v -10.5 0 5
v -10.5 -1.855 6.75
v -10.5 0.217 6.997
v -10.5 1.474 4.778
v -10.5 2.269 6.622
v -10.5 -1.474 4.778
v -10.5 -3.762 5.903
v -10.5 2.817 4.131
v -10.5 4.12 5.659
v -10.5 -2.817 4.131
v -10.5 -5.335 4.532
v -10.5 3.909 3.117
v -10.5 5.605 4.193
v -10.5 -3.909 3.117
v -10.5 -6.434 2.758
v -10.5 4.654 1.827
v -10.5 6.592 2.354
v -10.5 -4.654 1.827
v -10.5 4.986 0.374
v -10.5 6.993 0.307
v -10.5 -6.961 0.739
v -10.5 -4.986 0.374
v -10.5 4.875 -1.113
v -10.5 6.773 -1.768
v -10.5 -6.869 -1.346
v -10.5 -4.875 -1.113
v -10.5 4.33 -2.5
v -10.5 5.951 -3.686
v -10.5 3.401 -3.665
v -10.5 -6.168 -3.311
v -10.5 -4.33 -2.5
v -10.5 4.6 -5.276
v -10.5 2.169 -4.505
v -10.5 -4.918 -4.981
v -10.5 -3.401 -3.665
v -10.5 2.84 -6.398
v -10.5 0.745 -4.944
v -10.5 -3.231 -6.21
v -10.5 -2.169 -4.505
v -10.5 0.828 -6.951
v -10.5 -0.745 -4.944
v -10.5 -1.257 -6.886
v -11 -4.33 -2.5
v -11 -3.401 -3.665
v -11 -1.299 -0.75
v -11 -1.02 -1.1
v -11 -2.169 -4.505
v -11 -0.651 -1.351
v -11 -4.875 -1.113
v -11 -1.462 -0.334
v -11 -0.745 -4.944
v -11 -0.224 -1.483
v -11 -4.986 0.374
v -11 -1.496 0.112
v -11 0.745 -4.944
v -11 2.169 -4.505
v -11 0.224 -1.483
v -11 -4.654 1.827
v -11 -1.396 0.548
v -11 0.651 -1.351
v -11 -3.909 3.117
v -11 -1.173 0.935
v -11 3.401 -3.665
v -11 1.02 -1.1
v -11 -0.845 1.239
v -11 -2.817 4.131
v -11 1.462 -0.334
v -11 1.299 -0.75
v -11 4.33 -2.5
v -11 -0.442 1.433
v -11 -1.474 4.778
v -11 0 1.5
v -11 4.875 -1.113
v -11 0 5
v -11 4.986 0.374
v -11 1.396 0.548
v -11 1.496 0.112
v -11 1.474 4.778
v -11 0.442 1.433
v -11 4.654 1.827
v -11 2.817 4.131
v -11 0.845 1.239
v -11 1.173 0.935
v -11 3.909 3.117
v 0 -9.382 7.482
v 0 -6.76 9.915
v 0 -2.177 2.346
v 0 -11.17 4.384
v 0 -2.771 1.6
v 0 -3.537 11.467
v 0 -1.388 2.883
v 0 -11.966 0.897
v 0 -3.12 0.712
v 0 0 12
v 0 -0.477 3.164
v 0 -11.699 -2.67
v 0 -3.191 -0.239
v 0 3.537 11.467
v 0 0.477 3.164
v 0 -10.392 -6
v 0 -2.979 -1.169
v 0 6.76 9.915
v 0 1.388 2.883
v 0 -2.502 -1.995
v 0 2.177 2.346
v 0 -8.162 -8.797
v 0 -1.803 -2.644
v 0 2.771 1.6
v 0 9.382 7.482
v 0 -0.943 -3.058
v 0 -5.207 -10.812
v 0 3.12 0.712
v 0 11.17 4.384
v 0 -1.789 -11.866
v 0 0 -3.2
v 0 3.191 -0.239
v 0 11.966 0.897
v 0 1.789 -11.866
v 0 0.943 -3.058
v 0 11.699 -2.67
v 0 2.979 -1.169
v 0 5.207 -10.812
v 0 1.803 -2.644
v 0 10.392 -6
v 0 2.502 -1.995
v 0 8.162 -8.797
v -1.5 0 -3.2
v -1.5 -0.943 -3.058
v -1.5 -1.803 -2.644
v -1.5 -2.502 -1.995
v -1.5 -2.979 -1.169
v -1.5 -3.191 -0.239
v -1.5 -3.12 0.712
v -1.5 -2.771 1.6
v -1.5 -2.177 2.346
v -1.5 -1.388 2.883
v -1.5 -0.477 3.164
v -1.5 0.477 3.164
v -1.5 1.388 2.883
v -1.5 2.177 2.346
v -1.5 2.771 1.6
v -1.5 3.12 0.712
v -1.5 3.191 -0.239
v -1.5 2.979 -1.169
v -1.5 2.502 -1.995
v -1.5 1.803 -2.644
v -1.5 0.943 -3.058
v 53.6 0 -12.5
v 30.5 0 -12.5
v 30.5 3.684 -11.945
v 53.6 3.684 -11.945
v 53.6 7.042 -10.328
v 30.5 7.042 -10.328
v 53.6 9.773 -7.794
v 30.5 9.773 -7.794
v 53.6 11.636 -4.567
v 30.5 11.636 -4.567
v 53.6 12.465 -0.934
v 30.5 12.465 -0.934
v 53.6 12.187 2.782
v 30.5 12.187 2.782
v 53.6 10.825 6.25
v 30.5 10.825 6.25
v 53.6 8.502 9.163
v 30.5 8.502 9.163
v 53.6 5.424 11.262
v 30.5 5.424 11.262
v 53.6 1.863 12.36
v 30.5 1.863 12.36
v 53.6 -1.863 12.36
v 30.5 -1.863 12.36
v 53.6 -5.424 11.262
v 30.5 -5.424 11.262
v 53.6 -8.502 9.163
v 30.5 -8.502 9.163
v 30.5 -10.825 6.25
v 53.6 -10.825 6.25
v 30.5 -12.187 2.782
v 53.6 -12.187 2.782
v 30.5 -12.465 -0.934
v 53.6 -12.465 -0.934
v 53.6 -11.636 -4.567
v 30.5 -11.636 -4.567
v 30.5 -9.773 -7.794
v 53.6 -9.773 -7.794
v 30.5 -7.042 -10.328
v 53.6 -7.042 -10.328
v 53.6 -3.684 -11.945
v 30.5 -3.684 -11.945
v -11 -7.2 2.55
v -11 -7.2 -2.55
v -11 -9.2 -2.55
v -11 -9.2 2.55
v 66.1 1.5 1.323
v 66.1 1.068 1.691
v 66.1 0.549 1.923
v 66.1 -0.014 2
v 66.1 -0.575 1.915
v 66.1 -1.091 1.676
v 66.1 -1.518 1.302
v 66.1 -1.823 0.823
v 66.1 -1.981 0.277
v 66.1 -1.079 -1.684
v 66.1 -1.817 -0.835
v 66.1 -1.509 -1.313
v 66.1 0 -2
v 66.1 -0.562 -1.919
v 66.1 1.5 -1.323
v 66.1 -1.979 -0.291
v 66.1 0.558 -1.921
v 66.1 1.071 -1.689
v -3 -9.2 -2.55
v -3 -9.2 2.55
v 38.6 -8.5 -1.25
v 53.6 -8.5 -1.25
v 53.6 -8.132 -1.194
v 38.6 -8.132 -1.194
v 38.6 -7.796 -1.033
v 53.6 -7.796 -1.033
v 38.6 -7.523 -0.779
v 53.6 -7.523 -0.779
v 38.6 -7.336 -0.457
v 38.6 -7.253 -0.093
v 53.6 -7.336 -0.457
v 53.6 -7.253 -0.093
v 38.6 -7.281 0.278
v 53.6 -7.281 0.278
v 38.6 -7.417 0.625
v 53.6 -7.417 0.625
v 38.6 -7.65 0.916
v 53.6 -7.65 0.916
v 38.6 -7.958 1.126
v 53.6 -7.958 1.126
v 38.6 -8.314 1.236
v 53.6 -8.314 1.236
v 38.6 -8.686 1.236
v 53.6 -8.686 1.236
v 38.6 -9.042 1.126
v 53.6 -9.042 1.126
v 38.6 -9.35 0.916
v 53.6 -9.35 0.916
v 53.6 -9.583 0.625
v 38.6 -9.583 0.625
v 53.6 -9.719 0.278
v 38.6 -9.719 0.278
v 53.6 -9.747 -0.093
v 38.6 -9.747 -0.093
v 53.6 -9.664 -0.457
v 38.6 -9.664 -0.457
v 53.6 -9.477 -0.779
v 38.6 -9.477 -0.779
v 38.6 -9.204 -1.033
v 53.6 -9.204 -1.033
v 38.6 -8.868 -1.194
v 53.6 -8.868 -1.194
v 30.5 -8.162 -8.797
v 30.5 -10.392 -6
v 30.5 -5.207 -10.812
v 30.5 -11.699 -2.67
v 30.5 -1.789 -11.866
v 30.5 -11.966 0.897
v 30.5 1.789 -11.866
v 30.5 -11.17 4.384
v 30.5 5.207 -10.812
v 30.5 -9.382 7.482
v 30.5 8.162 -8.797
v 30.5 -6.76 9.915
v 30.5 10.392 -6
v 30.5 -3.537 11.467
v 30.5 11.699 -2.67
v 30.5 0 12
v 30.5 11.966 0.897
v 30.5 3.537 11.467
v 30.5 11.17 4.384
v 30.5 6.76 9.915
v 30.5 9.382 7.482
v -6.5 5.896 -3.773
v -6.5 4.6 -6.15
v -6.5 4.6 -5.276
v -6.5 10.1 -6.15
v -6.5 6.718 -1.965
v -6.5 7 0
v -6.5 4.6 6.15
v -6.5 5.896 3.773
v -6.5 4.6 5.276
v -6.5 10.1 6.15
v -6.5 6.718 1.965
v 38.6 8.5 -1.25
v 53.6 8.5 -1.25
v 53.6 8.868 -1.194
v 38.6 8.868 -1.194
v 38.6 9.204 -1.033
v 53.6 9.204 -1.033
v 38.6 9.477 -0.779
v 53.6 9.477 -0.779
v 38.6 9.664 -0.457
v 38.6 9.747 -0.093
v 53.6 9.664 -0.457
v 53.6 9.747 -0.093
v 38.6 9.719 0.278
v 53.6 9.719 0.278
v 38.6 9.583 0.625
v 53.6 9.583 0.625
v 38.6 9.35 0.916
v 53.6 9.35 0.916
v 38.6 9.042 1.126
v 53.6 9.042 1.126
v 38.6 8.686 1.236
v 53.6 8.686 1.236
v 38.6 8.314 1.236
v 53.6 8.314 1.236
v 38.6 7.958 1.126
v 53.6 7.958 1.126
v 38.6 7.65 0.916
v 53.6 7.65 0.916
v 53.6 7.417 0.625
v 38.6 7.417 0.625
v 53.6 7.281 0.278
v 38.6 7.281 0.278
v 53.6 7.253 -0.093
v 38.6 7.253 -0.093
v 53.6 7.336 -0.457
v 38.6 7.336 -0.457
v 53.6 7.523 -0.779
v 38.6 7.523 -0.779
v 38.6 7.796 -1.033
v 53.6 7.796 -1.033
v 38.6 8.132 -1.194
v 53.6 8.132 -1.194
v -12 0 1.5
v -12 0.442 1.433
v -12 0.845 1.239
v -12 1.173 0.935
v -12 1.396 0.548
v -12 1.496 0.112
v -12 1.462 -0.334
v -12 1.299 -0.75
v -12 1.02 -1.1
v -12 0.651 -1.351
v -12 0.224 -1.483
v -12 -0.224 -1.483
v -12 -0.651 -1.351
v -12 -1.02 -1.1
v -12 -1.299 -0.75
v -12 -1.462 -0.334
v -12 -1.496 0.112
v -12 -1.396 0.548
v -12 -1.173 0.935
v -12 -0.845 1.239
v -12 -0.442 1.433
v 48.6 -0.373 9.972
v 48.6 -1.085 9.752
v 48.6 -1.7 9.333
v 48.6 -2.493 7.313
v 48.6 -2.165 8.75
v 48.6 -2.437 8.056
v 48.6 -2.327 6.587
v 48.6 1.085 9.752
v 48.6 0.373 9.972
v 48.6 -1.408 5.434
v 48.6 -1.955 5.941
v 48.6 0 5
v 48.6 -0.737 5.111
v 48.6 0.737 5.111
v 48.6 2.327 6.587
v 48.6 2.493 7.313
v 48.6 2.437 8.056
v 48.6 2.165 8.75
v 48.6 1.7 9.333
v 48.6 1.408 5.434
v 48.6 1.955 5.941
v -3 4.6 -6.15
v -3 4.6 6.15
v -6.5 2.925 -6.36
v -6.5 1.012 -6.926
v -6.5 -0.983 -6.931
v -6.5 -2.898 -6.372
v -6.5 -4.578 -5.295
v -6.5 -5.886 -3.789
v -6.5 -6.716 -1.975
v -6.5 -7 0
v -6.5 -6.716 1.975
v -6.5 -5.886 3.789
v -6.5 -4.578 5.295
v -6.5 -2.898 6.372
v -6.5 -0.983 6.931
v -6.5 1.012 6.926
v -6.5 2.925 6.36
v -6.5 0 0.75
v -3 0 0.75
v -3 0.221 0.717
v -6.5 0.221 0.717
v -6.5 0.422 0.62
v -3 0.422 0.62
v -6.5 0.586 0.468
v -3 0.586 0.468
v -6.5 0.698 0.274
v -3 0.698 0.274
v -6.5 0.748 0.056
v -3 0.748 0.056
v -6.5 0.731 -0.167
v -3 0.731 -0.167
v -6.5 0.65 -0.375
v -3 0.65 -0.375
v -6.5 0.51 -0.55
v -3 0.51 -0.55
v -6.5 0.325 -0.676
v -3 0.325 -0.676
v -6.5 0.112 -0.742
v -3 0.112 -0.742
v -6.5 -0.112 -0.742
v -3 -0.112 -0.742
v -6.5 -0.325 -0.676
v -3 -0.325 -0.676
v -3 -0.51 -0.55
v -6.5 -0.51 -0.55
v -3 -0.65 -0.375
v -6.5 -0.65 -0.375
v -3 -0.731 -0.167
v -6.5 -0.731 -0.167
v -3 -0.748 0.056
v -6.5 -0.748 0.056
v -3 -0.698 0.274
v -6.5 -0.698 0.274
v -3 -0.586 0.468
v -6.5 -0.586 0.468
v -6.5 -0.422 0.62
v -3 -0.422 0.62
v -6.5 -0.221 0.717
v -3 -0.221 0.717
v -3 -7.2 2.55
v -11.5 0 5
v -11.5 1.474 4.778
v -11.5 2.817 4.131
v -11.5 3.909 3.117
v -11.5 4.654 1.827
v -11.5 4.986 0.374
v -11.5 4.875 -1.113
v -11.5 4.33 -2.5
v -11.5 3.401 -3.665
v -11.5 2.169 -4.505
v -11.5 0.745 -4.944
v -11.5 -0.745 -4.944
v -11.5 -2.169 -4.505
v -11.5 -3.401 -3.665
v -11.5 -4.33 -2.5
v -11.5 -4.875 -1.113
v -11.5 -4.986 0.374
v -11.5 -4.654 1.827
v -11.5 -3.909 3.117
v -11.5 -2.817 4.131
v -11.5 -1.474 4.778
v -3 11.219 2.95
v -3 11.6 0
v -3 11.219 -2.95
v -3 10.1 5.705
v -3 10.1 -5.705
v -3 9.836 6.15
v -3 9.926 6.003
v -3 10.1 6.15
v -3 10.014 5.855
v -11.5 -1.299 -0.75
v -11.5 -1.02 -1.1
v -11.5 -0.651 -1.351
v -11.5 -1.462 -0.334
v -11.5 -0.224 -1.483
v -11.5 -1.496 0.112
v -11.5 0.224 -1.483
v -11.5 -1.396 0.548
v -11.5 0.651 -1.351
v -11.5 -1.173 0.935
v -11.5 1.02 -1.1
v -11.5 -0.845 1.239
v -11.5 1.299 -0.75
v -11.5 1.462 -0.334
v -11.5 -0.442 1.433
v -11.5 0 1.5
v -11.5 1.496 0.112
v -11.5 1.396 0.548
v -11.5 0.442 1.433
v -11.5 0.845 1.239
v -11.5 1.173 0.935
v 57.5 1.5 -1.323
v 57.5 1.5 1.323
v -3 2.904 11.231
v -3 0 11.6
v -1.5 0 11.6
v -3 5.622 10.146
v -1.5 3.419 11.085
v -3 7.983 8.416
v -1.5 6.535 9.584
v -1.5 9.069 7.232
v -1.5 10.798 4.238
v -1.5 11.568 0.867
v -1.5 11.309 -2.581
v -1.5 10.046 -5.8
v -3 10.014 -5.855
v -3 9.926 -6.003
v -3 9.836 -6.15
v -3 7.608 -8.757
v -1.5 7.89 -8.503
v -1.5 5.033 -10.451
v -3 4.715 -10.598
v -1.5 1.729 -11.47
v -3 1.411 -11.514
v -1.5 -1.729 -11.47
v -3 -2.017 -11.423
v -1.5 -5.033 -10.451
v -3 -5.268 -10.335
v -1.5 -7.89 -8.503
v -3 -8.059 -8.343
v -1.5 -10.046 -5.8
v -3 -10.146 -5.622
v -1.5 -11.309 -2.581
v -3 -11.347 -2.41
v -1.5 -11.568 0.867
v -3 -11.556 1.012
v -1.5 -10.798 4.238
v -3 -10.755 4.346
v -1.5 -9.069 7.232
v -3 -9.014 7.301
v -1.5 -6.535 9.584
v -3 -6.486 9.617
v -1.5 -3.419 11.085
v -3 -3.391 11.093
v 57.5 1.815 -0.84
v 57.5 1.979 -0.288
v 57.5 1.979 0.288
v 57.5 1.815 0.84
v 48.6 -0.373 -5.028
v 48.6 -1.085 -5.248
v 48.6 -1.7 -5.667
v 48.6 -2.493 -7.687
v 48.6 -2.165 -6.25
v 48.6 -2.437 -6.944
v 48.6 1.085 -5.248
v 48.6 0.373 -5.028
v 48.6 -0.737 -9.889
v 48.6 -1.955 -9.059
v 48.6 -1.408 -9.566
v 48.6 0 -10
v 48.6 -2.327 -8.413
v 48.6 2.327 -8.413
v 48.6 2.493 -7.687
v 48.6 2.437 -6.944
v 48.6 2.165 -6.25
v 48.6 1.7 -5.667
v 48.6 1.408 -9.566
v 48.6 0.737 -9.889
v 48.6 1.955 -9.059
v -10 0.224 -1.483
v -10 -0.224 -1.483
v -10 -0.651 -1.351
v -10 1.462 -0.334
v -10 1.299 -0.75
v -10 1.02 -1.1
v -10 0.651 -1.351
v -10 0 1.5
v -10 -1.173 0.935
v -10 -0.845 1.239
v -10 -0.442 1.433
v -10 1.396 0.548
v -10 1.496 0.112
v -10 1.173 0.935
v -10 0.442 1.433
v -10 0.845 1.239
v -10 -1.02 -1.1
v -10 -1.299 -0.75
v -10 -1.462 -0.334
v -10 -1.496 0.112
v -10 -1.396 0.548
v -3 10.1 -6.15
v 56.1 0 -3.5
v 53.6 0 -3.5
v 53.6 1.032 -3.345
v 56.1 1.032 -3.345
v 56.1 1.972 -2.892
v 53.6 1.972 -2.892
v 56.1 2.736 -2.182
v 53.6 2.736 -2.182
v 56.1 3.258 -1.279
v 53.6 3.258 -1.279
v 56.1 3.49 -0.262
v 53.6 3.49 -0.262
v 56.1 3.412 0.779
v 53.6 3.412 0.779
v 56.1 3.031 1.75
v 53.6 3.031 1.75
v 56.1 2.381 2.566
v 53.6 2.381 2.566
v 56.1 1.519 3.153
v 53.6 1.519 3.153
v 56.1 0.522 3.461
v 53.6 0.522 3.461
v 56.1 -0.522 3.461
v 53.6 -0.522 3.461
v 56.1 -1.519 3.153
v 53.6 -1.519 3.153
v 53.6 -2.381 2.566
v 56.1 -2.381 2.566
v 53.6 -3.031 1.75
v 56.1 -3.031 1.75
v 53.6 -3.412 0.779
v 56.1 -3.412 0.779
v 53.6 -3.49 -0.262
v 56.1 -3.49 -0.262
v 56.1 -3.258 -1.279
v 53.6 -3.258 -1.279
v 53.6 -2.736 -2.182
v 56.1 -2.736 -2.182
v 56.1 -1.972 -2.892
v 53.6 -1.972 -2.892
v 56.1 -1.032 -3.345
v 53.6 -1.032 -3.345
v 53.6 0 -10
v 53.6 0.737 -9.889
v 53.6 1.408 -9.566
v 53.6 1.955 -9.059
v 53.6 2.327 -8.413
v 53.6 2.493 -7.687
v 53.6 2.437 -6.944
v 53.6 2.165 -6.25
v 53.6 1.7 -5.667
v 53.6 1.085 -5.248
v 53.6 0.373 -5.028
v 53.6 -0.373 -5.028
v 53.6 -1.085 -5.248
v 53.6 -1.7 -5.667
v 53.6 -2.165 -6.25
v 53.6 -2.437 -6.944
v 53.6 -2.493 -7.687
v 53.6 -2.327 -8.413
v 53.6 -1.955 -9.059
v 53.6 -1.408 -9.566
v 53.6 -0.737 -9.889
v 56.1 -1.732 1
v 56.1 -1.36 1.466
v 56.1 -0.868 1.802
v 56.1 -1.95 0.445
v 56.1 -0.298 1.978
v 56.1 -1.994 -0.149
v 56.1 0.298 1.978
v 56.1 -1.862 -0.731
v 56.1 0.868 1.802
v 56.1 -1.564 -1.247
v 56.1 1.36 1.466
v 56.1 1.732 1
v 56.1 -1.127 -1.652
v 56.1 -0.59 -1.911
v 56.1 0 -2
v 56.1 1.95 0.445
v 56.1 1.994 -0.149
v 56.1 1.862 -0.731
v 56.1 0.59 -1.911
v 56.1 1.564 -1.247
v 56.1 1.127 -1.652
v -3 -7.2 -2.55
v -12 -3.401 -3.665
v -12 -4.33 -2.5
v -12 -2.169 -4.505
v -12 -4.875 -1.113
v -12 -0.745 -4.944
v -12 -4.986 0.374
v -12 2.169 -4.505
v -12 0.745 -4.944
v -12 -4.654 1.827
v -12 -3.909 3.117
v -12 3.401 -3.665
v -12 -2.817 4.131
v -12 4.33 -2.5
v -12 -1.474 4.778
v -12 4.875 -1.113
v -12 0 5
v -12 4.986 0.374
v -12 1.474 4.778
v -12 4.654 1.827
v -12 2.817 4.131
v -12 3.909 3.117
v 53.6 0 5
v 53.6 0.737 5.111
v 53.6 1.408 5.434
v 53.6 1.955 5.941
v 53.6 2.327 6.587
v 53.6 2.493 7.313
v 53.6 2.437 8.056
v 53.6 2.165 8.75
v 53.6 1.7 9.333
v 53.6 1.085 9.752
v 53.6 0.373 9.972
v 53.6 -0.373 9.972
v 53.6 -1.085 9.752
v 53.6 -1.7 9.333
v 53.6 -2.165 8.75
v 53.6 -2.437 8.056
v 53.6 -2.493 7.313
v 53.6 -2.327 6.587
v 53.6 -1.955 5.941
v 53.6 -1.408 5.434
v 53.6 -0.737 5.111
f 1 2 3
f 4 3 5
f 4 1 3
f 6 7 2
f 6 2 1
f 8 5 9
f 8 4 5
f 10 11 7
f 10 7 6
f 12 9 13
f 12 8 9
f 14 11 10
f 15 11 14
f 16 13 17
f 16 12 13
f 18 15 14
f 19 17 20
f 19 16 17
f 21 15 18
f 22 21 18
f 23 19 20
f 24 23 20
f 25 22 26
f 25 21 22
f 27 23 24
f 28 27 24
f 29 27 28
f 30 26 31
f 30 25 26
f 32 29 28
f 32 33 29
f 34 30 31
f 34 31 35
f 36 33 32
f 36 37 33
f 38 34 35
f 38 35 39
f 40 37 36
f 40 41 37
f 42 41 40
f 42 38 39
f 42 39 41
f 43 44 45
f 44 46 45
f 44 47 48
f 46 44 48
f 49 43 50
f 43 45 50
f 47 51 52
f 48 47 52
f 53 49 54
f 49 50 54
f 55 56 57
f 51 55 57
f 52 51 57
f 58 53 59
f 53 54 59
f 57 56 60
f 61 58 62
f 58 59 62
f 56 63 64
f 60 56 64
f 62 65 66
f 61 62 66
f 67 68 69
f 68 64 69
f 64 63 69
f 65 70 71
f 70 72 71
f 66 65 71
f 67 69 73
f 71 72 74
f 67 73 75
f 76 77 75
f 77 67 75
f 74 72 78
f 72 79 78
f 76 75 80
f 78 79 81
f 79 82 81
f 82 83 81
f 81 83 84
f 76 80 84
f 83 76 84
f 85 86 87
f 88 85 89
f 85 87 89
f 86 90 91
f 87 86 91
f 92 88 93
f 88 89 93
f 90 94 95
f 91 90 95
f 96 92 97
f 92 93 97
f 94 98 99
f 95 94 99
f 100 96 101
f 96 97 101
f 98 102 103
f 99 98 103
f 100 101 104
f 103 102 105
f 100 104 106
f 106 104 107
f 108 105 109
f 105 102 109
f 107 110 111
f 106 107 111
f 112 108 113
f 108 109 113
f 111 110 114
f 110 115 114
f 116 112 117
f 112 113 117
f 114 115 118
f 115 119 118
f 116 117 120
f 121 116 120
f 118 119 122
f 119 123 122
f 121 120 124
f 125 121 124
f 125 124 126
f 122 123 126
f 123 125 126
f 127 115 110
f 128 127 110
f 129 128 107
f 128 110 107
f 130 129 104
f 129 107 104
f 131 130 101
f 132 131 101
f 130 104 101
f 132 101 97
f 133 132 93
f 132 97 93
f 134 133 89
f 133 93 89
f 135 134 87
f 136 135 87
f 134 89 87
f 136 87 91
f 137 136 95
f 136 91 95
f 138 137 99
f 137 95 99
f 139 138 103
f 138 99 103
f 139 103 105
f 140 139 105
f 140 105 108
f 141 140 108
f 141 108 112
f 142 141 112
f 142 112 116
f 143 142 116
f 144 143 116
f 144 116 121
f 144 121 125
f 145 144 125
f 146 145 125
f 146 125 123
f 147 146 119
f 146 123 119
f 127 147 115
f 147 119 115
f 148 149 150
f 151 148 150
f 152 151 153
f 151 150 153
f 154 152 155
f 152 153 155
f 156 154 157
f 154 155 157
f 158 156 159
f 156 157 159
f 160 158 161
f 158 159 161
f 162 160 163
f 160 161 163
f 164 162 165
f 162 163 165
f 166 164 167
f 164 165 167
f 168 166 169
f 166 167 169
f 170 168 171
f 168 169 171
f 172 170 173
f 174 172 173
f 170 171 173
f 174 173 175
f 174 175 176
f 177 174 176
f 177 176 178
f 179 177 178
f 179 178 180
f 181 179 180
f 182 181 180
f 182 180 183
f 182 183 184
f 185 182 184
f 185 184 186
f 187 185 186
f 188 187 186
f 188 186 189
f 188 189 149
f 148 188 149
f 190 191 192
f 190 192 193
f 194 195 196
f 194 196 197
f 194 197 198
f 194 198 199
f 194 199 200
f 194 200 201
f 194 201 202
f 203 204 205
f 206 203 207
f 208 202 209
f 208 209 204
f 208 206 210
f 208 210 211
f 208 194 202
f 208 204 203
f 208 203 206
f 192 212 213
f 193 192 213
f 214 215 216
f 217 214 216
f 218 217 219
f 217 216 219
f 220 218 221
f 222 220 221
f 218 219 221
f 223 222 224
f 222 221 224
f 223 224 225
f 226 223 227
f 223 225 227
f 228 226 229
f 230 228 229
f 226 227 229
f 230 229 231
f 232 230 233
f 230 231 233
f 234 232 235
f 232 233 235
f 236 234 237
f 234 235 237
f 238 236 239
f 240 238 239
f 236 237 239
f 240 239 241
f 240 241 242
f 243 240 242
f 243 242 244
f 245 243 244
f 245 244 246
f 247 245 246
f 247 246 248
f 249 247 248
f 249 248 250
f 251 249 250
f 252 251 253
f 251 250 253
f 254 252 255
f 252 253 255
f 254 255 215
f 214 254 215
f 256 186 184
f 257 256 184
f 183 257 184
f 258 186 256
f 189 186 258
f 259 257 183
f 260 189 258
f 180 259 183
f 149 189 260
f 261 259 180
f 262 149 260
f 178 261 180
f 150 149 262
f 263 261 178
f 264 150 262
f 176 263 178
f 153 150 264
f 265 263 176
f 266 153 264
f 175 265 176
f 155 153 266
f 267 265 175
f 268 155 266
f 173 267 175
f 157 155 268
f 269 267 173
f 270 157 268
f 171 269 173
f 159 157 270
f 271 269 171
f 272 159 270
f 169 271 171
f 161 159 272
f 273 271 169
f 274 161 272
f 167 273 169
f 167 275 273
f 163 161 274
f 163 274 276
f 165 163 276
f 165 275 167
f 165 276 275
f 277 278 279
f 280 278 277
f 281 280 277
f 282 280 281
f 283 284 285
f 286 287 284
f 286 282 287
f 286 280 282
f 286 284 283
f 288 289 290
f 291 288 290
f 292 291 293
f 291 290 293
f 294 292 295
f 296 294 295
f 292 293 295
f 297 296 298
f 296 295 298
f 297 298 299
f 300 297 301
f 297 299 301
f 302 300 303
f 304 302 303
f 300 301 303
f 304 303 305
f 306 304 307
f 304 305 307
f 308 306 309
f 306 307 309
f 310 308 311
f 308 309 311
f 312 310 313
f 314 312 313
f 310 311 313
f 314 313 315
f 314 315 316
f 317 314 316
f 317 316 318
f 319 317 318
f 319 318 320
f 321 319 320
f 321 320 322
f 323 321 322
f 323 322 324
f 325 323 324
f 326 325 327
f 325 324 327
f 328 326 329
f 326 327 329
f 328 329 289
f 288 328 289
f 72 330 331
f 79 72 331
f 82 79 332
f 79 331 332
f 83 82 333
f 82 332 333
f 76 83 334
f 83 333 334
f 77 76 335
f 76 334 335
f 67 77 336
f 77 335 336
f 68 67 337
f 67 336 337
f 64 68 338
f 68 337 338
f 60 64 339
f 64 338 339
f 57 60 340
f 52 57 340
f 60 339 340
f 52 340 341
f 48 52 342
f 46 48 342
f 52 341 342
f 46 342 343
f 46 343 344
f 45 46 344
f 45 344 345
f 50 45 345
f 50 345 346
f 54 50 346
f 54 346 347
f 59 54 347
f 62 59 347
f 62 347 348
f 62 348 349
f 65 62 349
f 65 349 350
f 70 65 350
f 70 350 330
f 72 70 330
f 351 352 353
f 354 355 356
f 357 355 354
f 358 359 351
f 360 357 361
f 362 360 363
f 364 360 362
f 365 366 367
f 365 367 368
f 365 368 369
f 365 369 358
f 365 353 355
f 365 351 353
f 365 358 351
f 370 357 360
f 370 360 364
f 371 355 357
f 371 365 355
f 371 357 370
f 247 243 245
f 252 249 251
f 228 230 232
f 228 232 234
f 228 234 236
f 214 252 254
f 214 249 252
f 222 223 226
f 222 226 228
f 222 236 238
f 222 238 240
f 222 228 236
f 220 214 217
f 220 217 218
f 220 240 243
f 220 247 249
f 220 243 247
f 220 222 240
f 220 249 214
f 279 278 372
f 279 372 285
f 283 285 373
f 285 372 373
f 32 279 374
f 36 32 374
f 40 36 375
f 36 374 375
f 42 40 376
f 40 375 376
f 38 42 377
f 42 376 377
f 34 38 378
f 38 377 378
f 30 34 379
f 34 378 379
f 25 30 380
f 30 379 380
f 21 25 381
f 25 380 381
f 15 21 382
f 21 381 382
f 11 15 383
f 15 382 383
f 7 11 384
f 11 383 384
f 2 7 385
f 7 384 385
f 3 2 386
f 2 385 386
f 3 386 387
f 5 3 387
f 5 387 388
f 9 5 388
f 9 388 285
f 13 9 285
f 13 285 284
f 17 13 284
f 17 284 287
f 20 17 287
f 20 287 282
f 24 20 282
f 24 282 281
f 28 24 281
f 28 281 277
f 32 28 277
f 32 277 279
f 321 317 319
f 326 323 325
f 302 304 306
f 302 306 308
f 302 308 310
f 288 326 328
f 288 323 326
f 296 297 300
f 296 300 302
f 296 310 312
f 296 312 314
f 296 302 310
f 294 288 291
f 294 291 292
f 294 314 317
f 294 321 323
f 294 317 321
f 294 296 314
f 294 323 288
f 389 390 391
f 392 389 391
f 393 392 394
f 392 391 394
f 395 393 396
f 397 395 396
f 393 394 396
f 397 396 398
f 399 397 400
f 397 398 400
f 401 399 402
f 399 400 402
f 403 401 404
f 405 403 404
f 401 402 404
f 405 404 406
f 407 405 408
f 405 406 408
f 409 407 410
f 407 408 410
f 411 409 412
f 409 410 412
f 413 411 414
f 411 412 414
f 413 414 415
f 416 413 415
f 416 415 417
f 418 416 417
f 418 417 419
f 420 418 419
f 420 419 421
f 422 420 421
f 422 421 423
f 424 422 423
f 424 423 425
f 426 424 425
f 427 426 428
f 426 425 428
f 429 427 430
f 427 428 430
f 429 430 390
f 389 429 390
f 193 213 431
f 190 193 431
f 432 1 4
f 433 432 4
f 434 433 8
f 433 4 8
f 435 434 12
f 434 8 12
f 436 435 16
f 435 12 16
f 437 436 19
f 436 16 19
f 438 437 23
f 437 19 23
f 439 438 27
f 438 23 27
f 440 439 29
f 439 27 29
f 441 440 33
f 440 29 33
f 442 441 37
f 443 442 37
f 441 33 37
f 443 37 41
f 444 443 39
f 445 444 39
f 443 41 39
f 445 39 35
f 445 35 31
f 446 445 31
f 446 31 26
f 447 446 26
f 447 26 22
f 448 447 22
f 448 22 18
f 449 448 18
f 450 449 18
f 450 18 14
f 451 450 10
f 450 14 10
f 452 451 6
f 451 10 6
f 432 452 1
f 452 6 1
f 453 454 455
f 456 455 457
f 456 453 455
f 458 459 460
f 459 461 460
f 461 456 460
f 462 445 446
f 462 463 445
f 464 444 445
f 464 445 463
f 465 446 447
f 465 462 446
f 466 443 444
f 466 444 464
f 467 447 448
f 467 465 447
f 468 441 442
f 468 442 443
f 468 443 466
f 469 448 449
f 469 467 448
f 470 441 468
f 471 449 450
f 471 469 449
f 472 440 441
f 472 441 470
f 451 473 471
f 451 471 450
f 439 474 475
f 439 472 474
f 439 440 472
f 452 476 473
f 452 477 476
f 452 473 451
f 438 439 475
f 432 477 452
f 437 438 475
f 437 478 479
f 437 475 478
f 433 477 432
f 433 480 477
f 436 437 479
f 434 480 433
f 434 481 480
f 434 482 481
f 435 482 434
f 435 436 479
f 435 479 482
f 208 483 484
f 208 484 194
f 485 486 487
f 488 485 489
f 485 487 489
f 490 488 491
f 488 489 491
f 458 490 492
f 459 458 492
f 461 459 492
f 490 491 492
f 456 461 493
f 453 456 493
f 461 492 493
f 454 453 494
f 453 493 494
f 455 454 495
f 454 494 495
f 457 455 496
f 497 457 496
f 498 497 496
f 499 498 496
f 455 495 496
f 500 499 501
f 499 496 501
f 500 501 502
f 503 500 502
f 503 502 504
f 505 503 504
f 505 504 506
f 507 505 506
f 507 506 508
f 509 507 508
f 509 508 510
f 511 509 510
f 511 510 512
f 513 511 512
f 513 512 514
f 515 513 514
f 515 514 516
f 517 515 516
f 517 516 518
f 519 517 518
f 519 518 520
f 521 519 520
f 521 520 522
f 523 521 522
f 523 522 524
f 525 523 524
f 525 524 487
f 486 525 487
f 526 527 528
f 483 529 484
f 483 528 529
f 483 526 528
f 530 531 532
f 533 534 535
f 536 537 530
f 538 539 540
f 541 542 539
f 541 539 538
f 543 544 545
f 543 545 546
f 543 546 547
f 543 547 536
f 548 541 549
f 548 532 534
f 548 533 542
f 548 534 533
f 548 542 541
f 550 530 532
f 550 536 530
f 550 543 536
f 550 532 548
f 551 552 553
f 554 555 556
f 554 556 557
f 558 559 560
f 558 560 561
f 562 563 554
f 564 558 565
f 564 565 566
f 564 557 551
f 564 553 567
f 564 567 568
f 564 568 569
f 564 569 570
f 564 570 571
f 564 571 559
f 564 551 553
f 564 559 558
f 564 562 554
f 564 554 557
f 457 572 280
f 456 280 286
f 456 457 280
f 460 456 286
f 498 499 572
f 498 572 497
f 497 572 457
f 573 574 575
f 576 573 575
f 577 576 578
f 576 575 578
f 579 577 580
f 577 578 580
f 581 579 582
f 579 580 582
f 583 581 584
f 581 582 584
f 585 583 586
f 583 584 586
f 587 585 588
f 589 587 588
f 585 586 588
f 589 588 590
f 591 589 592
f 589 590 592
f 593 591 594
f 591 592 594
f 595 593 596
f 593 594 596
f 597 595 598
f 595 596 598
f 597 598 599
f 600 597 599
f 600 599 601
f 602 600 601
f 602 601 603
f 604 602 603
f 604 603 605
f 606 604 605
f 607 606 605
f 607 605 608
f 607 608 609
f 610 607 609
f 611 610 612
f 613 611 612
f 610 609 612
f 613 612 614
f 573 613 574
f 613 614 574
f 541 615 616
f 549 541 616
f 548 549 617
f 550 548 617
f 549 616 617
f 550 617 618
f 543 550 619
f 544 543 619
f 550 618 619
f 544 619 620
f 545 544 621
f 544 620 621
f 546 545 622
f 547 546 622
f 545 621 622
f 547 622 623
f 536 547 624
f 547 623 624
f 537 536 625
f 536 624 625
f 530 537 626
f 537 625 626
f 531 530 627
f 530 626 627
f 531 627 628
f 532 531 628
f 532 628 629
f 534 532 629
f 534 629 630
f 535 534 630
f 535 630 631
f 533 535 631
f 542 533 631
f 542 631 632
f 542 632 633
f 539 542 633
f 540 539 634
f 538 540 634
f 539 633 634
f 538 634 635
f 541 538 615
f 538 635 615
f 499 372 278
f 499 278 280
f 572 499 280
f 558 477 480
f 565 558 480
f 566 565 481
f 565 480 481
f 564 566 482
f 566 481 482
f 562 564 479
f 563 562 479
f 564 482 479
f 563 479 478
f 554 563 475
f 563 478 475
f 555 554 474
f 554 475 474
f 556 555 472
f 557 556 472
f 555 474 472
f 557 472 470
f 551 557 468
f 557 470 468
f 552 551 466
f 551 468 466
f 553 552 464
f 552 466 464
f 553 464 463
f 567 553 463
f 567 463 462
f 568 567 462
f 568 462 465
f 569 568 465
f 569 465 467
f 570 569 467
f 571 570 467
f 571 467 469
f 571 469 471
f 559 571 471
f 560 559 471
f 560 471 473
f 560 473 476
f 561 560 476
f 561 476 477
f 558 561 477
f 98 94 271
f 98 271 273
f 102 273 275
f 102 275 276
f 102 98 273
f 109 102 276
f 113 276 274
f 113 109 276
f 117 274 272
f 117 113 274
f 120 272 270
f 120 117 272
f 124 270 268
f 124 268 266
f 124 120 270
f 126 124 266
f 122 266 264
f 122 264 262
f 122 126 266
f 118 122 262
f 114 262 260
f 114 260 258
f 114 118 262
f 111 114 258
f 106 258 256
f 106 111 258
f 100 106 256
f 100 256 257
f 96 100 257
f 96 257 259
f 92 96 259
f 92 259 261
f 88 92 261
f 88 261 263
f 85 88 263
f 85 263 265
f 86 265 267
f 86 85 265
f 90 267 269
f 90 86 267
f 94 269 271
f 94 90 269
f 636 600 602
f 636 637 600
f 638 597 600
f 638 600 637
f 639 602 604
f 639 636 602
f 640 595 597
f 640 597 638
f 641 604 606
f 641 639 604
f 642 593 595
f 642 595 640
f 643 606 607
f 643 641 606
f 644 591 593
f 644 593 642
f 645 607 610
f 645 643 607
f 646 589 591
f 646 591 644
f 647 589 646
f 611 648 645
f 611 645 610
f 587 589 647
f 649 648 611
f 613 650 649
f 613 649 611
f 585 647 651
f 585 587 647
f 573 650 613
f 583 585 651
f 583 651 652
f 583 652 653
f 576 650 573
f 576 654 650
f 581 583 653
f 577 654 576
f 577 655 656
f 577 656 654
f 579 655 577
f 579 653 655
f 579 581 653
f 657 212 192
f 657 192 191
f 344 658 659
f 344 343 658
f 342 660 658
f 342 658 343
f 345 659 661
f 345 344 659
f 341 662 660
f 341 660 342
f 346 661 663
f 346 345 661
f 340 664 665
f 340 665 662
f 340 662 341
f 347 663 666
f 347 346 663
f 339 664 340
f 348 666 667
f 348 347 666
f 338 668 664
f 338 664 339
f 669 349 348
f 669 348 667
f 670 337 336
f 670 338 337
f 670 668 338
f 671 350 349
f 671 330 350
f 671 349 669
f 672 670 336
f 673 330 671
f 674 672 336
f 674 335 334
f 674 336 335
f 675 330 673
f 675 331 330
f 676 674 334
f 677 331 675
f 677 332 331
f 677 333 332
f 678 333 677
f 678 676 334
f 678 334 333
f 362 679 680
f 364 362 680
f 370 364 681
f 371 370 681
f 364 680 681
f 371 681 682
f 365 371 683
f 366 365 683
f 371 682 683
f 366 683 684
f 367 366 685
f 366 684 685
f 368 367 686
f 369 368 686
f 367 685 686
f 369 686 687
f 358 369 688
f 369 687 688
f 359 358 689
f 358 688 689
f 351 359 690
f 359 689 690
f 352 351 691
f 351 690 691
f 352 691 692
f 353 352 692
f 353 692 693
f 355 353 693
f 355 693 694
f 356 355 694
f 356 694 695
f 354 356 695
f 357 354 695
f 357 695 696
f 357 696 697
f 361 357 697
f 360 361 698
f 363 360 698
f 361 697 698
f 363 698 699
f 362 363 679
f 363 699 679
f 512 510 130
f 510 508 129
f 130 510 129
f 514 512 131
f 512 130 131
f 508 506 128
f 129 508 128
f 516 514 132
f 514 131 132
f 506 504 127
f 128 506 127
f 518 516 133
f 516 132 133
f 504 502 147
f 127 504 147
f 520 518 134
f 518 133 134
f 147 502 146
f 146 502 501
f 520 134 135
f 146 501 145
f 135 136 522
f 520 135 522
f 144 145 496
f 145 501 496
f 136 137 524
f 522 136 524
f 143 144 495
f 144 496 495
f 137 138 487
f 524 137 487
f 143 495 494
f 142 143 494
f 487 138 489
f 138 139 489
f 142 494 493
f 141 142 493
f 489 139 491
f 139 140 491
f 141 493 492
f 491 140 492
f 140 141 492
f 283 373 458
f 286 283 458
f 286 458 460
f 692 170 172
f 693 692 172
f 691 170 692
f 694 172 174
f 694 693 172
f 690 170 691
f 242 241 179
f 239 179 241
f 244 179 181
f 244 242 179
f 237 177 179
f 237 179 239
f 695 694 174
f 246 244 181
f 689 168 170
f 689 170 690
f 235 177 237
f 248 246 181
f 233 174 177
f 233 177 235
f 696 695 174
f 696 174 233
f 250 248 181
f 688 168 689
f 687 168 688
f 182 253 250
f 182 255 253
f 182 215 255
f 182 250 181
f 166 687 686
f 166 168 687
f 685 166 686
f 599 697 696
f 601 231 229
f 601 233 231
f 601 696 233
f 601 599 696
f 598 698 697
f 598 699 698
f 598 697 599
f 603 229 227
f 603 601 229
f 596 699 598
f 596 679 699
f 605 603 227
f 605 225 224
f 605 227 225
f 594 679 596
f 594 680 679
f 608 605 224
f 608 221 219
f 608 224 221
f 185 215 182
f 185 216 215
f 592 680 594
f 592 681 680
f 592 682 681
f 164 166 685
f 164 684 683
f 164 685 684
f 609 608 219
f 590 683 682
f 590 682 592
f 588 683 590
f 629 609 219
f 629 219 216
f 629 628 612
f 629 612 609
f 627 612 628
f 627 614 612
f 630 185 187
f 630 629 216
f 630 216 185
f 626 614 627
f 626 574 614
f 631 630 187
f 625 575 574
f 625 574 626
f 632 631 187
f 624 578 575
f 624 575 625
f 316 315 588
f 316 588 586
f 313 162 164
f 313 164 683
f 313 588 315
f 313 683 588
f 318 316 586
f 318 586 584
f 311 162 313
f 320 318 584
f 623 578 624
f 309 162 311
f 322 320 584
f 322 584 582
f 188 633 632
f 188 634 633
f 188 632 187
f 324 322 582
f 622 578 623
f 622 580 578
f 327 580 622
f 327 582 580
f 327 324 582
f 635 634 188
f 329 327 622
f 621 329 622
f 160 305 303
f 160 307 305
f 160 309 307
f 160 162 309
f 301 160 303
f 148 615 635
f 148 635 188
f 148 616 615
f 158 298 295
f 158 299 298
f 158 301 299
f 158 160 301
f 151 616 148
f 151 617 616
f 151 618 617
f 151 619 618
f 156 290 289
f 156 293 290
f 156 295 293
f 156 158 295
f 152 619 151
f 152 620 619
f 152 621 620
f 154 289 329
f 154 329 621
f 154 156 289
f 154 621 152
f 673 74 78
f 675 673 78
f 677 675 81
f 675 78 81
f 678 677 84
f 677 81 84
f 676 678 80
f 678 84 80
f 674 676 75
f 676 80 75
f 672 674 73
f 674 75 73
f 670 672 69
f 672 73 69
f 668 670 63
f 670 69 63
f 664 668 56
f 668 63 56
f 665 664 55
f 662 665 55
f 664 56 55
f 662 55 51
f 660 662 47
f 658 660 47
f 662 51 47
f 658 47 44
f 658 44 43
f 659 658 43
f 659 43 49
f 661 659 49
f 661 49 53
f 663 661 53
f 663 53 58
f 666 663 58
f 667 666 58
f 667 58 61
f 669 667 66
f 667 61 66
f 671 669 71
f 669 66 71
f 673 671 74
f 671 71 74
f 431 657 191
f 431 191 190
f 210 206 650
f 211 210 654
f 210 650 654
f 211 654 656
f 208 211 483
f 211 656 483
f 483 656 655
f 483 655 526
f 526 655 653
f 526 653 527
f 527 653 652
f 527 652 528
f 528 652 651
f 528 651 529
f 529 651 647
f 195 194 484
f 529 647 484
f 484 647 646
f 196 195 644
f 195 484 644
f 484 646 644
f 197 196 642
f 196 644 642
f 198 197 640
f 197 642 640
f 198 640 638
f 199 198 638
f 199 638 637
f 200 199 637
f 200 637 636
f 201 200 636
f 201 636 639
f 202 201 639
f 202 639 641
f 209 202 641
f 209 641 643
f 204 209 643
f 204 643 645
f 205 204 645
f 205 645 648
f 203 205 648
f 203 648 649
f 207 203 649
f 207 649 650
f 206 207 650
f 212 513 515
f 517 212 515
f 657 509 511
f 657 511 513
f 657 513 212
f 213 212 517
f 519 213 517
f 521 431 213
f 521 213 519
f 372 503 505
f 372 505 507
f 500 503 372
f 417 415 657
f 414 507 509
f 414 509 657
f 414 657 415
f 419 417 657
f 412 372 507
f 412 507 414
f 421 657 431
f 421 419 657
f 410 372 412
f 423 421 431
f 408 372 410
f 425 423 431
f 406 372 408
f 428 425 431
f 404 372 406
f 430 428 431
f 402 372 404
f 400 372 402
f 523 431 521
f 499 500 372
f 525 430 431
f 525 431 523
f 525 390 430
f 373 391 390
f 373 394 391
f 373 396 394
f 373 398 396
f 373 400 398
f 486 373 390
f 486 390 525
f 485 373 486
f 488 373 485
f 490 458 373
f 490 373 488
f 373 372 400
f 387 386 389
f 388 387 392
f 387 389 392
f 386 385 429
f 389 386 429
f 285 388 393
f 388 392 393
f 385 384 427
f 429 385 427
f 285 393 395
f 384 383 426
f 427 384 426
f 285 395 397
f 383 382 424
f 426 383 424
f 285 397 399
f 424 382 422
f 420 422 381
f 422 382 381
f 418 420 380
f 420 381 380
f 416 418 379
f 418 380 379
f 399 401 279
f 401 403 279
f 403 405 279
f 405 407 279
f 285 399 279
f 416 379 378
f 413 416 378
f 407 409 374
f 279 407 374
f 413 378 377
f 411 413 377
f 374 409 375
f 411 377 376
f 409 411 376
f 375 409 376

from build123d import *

# Parameters (mm, degrees)
SKETCH_4_R             = 12.5
EXTRUDE_481_DEPTH      = 53.6
SKETCH_6_R             = 2
EXTRUDE_595_DEPTH      = 12.5
SKETCH_8_W             = 11.304
SKETCH_8_H             = 8.543704008
CUT_EXTRUDE_852_DEPTH  = 0.5
SKETCH_10_R            = 3.5
EXTRUDE_1010_DEPTH     = 2.5
SKETCH_14_R            = 1.25
CUT_EXTRUDE_1321_DEPTH = 15
SKETCH_16_R            = 2.5
CUT_EXTRUDE_1436_DEPTH = 5
SKETCH_18_R            = 3.2
EXTRUDE_1549_DEPTH     = 1.5
SKETCH_21_R            = 11.6
EXTRUDE_1657_DEPTH     = 1.5
SKETCH_23_W            = 12.3
SKETCH_23_H            = 5.5
EXTRUDE_1848_DEPTH     = 3.5
SKETCH_25_W            = 5.1
SKETCH_25_H            = 2
EXTRUDE_2147_DEPTH     = 8
SKETCH_27_R            = 0.75
EXTRUDE_2397_DEPTH     = 3.5
SKETCH_32_R            = 7
EXTRUDE_2516_DEPTH     = 4
SKETCH_33_R            = 5
EXTRUDE_12_DEPTH       = 1
SKETCH_35_R            = 5
EXTRUDE_2731_DEPTH     = 1
SKETCH_37_R            = 1.5
CUT_EXTRUDE_2844_DEPTH = 2
SKETCH_40_OUTSIDE_W    = 44.146
SKETCH_40_OUTSIDE_H    = 44.146
SKETCH_40_OUTSIDE_R    = 12
CUT_EXTRUDE_2998_DEPTH = 30.5


with BuildPart() as part:
    # Эскиз4 → Extrude 481 (new body)
    with BuildSketch(Plane(origin=(0, 0, 0), x_dir=(0, 0, -1), z_dir=(1, 0, 0))):
        Circle(SKETCH_4_R)
    extrude(amount=EXTRUDE_481_DEPTH)

    # Эскиз6 → Extrude 595 (add)
    with BuildSketch(Plane(origin=(53.6, 0, 0), x_dir=(0, 0, -1), z_dir=(1, 0, 0))):
        Circle(SKETCH_6_R)
    extrude(amount=EXTRUDE_595_DEPTH)

    # Эскиз8 → Cut-Extrude 852 (cut)
    with BuildSketch(Plane(origin=(0, 2, 0), x_dir=(1, 0, 0), z_dir=(0, 1, 0))):
        with Locations((63.152390779, -0.470627763)):
            Rectangle(SKETCH_8_W, SKETCH_8_H)
    extrude(amount=-CUT_EXTRUDE_852_DEPTH, mode=Mode.SUBTRACT)

    # Эскиз10 → Extrude 1010 (add)
    with BuildSketch(Plane(origin=(53.6, 0, 0), x_dir=(0, 0, -1), z_dir=(1, 0, 0))):
        Circle(SKETCH_10_R)
    extrude(amount=EXTRUDE_1010_DEPTH)

    # Эскиз14 → Cut-Extrude 1321 (cut)
    with BuildSketch(Plane(origin=(53.6, 0, 0), x_dir=(0, 0, -1), z_dir=(1, 0, 0))):
        with Locations((0, 8.5)):
            Circle(SKETCH_14_R)
        with Locations((0, -8.5)):
            Circle(SKETCH_14_R)
    extrude(amount=-CUT_EXTRUDE_1321_DEPTH, mode=Mode.SUBTRACT)

    # Эскиз16 → Cut-Extrude 1436 (cut)
    with BuildSketch(Plane(origin=(53.6, 0, 0), x_dir=(0, 0, -1), z_dir=(1, 0, 0))):
        with Locations((-7.5, 0)):
            Circle(SKETCH_16_R)
        with Locations((7.5, 0)):
            Circle(SKETCH_16_R)
    extrude(amount=-CUT_EXTRUDE_1436_DEPTH, mode=Mode.SUBTRACT)

    # Эскиз18 → Extrude 1549 (add)
    with BuildSketch(Plane.ZY):
        with Locations(Location((0, 0, 0), (0, 0, 180))):
            Circle(SKETCH_18_R)
    extrude(amount=EXTRUDE_1549_DEPTH)

    # Эскиз21 → Extrude 1657 (add)
    with BuildSketch(Plane.ZY.offset(1.5)):
        Circle(SKETCH_21_R)
    extrude(amount=EXTRUDE_1657_DEPTH)

    # Эскиз23 → Extrude 1848 (add)
    with BuildSketch(Plane.ZY.offset(3)):
        with Locations((0, 7.35)):
            Rectangle(SKETCH_23_W, SKETCH_23_H)
    extrude(amount=EXTRUDE_1848_DEPTH)

    # Эскиз25 → Extrude 2147 (add)
    with BuildSketch(Plane.ZY.offset(3)):
        with Locations((0, -8.2)):
            Rectangle(SKETCH_25_W, SKETCH_25_H)
    extrude(amount=EXTRUDE_2147_DEPTH)

    # Эскиз27 → Extrude 2397 (add)
    with BuildSketch(Plane.ZY.offset(3)):
        Circle(SKETCH_27_R)
    extrude(amount=EXTRUDE_2397_DEPTH)

    # Эскиз32 → Extrude 2516 (add)
    with BuildSketch(Plane.ZY.offset(6.5)):
        with Locations(Location((0, 0, 0), (0, 0, 138.91766686))):
            Circle(SKETCH_32_R)
    extrude(amount=EXTRUDE_2516_DEPTH)

    # Эскиз35 → Extrude 2731 (add)
    with BuildSketch(Plane.ZY.offset(10.5)):
        Circle(SKETCH_35_R)
    extrude(amount=EXTRUDE_2731_DEPTH)


with BuildPart() as body_2:
    # Эскиз33 → Бобышка-Вытянуть12 (new body)
    with BuildSketch(Plane.ZY.offset(11)):
        Circle(SKETCH_33_R)
    extrude(amount=EXTRUDE_12_DEPTH)


with BuildPart() as cut_extrude_2844_tool:
    # Эскиз37 → Cut-Extrude 2844 (new body)
    with BuildSketch(Plane.ZY.offset(12)):
        Circle(SKETCH_37_R)
    extrude(amount=-CUT_EXTRUDE_2844_DEPTH)


with BuildPart() as part_1:
    add(part.part)

    # Cut-Extrude 2844: cut by cut_extrude_2844_tool
    add(cut_extrude_2844_tool.part, mode=Mode.SUBTRACT)

    # Эскиз40 outside → Cut-Extrude 2998 (cut)
    with BuildSketch(Plane.ZY):
        Rectangle(SKETCH_40_OUTSIDE_W, SKETCH_40_OUTSIDE_H)
        Circle(SKETCH_40_OUTSIDE_R, mode=Mode.SUBTRACT)
    extrude(amount=-CUT_EXTRUDE_2998_DEPTH, mode=Mode.SUBTRACT)


with BuildPart() as body_2_1:
    add(body_2.part)

    # Cut-Extrude 2844: cut by cut_extrude_2844_tool
    add(cut_extrude_2844_tool.part, mode=Mode.SUBTRACT)


solid = Compound([part_1.part, body_2_1.part])
